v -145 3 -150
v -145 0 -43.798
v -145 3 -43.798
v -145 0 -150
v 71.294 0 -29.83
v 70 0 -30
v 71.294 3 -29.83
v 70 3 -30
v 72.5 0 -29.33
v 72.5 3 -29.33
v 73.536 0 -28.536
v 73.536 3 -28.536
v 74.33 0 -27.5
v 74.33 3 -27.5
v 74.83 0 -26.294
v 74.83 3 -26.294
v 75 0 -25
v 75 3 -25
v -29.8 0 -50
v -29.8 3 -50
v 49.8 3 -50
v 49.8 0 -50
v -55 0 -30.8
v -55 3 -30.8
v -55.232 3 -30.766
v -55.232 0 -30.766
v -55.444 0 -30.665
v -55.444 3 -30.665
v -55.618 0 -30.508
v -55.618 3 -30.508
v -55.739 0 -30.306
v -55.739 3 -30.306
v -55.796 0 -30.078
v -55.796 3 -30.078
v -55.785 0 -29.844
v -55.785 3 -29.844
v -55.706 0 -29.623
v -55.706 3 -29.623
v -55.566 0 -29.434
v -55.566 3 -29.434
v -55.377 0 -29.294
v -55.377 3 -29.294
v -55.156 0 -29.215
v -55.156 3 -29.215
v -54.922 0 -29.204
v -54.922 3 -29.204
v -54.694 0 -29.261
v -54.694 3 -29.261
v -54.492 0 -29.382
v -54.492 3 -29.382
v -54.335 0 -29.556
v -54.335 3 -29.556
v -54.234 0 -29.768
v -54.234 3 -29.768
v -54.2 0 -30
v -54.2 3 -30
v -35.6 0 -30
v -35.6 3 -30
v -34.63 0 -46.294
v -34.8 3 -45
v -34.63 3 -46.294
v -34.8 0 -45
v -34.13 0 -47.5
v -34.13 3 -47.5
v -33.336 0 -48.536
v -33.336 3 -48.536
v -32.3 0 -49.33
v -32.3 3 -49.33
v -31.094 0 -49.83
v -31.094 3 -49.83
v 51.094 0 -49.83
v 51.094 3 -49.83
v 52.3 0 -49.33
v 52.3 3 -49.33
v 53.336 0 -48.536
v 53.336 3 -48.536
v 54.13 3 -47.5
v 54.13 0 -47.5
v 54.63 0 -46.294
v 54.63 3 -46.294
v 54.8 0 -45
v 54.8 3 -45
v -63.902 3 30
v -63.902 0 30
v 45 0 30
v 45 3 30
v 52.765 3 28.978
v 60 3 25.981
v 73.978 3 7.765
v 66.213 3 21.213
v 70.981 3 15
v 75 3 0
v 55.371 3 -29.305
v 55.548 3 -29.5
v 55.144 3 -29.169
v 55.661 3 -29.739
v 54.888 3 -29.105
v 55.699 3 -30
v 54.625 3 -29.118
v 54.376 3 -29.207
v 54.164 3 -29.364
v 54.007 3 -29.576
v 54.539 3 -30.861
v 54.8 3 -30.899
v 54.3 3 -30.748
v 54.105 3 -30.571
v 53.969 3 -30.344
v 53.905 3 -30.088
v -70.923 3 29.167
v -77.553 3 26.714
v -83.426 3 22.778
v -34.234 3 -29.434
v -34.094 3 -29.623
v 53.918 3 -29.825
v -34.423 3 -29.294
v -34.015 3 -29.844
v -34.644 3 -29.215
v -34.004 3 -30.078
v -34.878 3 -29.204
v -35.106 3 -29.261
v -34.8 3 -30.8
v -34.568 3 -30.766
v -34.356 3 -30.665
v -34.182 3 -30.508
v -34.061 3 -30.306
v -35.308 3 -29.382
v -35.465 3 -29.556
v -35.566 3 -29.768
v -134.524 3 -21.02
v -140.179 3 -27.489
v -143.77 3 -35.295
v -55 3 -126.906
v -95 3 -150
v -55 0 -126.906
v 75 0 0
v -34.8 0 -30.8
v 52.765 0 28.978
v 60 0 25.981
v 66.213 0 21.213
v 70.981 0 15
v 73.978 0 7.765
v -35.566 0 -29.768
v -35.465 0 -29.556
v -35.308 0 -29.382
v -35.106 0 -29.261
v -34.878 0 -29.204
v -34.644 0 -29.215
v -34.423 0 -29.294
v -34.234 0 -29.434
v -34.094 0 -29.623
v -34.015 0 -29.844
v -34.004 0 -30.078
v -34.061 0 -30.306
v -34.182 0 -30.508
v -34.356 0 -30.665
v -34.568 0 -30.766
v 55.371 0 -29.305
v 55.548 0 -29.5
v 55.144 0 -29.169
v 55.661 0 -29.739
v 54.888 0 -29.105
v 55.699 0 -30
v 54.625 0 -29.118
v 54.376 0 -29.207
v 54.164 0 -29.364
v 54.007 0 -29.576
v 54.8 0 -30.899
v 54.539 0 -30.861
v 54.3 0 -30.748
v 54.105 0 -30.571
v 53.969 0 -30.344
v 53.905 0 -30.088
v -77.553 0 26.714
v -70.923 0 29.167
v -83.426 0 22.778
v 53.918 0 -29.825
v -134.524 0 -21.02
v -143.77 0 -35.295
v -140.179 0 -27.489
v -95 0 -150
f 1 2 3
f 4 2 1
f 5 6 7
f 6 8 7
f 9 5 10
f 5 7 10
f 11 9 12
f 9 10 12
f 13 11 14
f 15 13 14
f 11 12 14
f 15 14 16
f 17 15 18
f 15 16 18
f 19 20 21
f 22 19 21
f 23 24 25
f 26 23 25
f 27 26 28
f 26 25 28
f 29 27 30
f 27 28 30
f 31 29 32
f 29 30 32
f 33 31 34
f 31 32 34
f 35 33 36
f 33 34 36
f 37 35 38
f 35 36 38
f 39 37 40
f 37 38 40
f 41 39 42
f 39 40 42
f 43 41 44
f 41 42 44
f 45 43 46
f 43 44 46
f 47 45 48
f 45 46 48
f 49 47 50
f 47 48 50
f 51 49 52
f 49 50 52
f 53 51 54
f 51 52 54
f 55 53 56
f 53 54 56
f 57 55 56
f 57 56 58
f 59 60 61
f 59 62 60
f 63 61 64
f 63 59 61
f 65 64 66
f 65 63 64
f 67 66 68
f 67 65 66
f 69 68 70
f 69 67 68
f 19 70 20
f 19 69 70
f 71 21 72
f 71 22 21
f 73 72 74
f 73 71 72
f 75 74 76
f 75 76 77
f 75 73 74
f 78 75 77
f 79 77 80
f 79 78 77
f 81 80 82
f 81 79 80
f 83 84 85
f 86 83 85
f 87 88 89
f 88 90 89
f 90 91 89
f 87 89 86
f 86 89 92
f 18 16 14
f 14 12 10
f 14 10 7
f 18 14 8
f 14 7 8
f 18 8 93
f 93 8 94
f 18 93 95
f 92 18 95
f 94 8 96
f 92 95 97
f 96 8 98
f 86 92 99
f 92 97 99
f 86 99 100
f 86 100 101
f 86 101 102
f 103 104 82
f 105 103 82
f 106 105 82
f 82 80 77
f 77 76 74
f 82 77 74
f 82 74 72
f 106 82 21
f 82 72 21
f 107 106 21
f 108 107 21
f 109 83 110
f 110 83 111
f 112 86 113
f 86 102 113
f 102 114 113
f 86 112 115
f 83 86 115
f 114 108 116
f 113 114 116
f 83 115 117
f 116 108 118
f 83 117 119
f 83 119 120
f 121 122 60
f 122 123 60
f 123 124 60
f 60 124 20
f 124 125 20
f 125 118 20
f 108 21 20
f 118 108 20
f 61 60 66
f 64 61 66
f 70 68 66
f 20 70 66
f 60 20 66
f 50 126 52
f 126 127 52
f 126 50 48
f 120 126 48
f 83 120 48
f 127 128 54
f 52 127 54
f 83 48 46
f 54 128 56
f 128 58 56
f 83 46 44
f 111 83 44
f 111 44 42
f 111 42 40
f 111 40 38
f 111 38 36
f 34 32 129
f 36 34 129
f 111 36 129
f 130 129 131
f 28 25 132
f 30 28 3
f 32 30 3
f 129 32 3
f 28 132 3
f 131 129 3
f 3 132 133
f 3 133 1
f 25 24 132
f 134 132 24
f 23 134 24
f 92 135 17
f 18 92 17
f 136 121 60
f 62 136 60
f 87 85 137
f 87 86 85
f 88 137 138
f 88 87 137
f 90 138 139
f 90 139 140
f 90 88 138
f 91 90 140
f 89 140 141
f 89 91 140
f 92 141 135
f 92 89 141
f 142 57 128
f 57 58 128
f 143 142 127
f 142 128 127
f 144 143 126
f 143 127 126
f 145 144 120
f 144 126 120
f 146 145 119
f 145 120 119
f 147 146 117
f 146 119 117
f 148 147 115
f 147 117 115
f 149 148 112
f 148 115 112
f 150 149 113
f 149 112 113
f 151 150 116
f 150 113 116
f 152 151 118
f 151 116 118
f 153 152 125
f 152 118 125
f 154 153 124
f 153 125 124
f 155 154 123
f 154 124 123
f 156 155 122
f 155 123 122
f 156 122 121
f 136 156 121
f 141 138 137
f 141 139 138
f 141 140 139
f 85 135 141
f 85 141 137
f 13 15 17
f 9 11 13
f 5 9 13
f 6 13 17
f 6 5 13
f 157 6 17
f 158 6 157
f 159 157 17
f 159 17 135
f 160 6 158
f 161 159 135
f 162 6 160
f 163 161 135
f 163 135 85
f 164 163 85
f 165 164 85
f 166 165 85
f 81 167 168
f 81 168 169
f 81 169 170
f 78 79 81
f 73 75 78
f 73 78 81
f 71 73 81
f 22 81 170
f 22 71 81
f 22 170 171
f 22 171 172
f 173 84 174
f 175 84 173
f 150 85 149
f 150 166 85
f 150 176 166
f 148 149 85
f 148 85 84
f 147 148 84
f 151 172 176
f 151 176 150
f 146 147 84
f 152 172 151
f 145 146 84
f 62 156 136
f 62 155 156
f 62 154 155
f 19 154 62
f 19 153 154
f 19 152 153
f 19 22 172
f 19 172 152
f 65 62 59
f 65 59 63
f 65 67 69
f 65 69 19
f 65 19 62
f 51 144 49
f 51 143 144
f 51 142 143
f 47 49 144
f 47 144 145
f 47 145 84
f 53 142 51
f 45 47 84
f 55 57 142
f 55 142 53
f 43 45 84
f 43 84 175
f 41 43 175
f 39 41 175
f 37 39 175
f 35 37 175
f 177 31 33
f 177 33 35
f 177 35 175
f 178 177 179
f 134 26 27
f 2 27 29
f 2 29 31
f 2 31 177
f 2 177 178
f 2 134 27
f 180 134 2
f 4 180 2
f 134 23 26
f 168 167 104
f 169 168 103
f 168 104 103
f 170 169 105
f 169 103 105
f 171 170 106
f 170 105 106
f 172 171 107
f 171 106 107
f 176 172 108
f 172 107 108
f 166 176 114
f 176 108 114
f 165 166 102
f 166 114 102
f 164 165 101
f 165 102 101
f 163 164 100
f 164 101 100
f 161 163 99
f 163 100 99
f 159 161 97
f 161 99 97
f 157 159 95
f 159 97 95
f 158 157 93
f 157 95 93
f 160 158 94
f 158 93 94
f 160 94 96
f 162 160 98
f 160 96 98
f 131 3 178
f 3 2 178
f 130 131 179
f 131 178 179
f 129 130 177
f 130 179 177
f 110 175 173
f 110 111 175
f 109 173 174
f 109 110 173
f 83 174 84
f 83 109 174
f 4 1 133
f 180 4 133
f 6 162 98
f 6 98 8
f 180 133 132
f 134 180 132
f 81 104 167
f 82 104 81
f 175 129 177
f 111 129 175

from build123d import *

# Parameters (mm, degrees)
SKETCH1_W           = 150
SKETCH1_H           = 60
BOSS_EXTRUDE1_DEPTH = 3
FILLET1_R           = 30
SKETCH2_W           = 89.6
SKETCH2_H           = 20
BOSS_EXTRUDE2_DEPTH = 3
FILLET2_R           = 30
SKETCH3_R           = 0.8
SKETCH3_R_2         = 0.899402105
CUT_EXTRUDE1_DEPTH  = 154.407952858
FILLET3_R           = 5
SKETCH4_W           = 20
SKETCH4_H           = 100
BOSS_EXTRUDE3_DEPTH = 3
BOSS_EXTRUDE4_DEPTH = 3


with BuildPart() as part:
    # Sketch1 → Boss-Extrude1 (new body)
    with BuildSketch(Plane(origin=(0, 0, 0), x_dir=(1, 0, 0), z_dir=(0, 1, 0))):
        Rectangle(SKETCH1_W, SKETCH1_H)
    extrude(amount=BOSS_EXTRUDE1_DEPTH)

    # Fillet1
    fillet1_edges = [part.edges().sort_by_distance(p)[0] for p in [
        (75, 1.5, 30),
    ]]
    fillet(fillet1_edges, radius=FILLET1_R)

    # Sketch2 → Boss-Extrude2 (add)
    with BuildSketch(Plane(origin=(0, 3, 0), x_dir=(1, 0, 0), z_dir=(0, 1, 0))):
        Polygon((-75, 30), (-55, 30), (-55, 50), (-145, 50), (-145, 30), align=None)
        Polygon((-75, -30), (-75, 30), (-145, 30), align=None)
        with Locations((10, 40)):
            Rectangle(SKETCH2_W, SKETCH2_H)
    extrude(amount=-BOSS_EXTRUDE2_DEPTH)

    # Fillet2
    fillet2_edges = [part.edges().sort_by_distance(p)[0] for p in [
        (-145, 1.5, -30),
        (-75, 1.5, 30),
    ]]
    fillet(fillet2_edges, radius=FILLET2_R)

    # Sketch3 → Cut-Extrude1 (cut, through all)
    with BuildSketch(Plane(origin=(0, 3, 0), x_dir=(1, 0, 0), z_dir=(0, 1, 0))):
        with Locations((-55, 30)):
            Circle(SKETCH3_R)
        with Locations((-34.8, 30)):
            Circle(SKETCH3_R)
        with Locations((54.8, 30)):
            Circle(SKETCH3_R_2)
    extrude(amount=-CUT_EXTRUDE1_DEPTH, mode=Mode.SUBTRACT)

    # Fillet3
    fillet3_edges = [part.edges().sort_by_distance(p)[0] for p in [
        (-34.8, 1.5, -50),
        (54.8, 1.5, -50),
        (75, 1.5, -30),
    ]]
    fillet(fillet3_edges, radius=FILLET3_R)

    # Sketch4 → Boss-Extrude3 (add)
    with BuildSketch(Plane(origin=(0, 0, 0), x_dir=(-1, 0, 0), z_dir=(0, -1, 0))):
        with Locations((135, 100)):
            Rectangle(SKETCH4_W, SKETCH4_H)
    extrude(amount=-BOSS_EXTRUDE3_DEPTH)

    # Sketch5 → Boss-Extrude4 (add)
    with BuildSketch(Plane(origin=(0, 3, 0), x_dir=(1, 0, 0), z_dir=(0, 1, 0))):
        Polygon((-55, 50), (-125, 50), (-125, 150), (-95, 150), (-55, 126.905989232), align=None)
    extrude(amount=-BOSS_EXTRUDE4_DEPTH)


solid = part.part
